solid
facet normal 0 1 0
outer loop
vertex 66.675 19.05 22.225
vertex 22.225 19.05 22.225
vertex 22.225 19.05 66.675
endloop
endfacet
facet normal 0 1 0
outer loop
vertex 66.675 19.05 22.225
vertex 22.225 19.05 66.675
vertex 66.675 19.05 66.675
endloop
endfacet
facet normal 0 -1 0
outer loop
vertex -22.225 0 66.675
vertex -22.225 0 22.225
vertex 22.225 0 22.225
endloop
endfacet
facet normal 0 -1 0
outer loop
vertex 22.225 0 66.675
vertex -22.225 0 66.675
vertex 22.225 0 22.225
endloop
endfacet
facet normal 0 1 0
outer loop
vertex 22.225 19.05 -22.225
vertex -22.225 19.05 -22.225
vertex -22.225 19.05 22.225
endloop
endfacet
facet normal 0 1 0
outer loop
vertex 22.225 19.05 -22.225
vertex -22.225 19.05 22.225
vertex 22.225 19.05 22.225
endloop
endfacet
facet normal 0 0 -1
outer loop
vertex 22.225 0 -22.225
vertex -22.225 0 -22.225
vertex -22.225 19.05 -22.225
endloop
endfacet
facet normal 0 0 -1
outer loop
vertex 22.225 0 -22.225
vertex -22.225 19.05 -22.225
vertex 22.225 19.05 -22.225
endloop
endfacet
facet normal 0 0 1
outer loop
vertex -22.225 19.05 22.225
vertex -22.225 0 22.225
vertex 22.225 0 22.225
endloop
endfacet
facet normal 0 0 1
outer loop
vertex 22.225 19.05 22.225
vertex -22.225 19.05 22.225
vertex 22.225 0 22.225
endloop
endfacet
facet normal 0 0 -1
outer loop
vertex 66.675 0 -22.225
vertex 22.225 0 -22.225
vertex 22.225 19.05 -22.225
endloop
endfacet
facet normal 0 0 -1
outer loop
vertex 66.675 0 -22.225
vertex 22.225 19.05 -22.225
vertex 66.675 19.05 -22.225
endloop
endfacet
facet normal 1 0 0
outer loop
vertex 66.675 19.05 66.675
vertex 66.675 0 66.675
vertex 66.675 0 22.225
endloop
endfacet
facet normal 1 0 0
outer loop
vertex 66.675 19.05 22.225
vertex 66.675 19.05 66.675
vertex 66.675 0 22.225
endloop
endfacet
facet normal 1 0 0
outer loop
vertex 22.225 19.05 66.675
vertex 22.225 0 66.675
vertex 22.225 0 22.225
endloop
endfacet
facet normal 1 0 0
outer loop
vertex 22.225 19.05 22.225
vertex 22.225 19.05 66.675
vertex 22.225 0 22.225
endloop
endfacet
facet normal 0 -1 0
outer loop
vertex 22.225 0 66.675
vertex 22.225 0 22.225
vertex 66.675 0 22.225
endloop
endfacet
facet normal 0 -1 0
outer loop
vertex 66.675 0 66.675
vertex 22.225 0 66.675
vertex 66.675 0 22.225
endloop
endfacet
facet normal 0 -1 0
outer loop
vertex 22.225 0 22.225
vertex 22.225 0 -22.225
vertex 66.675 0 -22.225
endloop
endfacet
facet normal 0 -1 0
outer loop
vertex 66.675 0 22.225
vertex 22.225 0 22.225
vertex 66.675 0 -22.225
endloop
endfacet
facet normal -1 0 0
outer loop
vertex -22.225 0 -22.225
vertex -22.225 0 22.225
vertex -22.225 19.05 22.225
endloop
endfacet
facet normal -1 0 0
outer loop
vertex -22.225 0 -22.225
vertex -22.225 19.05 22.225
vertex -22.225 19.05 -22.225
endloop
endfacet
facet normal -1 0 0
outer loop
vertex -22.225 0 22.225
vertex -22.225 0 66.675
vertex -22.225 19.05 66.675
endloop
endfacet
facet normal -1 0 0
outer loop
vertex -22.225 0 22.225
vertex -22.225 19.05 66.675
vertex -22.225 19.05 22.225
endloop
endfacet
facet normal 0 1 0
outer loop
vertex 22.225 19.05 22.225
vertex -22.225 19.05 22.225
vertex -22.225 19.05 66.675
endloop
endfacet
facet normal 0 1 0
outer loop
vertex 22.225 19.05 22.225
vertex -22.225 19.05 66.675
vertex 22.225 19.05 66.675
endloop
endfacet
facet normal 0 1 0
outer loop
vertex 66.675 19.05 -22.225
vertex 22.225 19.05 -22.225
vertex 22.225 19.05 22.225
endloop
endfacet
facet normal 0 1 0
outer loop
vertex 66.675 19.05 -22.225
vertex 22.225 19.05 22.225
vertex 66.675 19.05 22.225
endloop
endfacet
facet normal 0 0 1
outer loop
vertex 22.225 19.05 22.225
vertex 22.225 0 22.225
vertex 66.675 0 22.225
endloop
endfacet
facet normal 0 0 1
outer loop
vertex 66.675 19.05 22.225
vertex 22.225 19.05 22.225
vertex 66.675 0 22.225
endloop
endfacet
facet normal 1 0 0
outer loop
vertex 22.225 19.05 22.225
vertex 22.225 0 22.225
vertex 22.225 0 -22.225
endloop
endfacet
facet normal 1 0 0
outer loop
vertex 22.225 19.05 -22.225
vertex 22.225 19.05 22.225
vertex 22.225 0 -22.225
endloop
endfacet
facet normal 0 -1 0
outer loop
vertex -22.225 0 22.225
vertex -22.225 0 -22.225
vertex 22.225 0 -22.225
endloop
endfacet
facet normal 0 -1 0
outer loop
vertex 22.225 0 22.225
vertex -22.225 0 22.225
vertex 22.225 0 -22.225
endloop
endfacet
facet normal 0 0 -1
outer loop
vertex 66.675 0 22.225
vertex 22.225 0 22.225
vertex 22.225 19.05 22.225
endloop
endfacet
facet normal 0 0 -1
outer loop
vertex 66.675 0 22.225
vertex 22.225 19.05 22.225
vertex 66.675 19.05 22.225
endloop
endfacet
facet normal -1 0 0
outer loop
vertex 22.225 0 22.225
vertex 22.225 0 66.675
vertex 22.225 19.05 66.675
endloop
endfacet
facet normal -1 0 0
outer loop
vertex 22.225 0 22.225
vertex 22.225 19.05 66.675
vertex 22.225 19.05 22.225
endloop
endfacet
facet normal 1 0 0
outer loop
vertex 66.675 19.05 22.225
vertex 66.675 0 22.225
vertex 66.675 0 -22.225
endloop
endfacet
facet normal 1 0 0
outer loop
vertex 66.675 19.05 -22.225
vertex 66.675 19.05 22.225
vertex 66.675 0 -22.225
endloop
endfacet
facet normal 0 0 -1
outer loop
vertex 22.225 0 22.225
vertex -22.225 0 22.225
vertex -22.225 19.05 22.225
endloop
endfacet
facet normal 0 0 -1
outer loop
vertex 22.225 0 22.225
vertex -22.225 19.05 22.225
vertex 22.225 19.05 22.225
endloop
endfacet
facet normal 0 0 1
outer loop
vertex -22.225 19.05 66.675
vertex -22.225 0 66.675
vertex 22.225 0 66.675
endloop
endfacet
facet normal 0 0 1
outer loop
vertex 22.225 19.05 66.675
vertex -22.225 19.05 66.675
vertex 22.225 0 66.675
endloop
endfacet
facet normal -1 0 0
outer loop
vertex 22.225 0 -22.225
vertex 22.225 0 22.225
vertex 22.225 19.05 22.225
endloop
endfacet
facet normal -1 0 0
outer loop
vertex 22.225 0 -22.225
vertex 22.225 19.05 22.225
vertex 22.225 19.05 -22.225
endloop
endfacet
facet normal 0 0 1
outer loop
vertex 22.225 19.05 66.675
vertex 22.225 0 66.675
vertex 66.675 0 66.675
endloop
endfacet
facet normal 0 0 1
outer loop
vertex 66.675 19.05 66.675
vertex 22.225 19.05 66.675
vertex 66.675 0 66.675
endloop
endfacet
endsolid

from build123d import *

# Parameters (mm, degrees)
SKETCH1_W           = 44.45
SKETCH1_H           = 44.45
BOSS_EXTRUDE1_DEPTH = 19.05
SKETCH3_W           = 44.45
SKETCH3_H           = 44.45
BOSS_EXTRUDE2_DEPTH = 19.05
SKETCH4_W           = 44.45
SKETCH4_H           = 44.45
BOSS_EXTRUDE3_DEPTH = 19.05
SKETCH5_W           = 44.45
SKETCH5_H           = 44.45
BOSS_EXTRUDE4_DEPTH = 19.05


with BuildPart() as part:
    # Sketch1 → Boss-Extrude1 (new body)
    with BuildSketch(Plane(origin=(0, 0, 0), x_dir=(1, 0, 0), z_dir=(0, 1, 0))):
        Rectangle(SKETCH1_W, SKETCH1_H)
    extrude(amount=BOSS_EXTRUDE1_DEPTH)


with BuildPart() as body_2:
    # Sketch3 → Boss-Extrude2 (new body)
    with BuildSketch(Plane(origin=(0, 0, 0), x_dir=(1, 0, 0), z_dir=(0, 1, 0))):
        with Locations((44.45, 0)):
            Rectangle(SKETCH3_W, SKETCH3_H)
    extrude(amount=BOSS_EXTRUDE2_DEPTH)


with BuildPart() as body_3:
    # Sketch4 → Boss-Extrude3 (new body)
    with BuildSketch(Plane(origin=(0, 0, 0), x_dir=(1, 0, 0), z_dir=(0, 1, 0))):
        with Locations((0, -44.45)):
            Rectangle(SKETCH4_W, SKETCH4_H)
    extrude(amount=BOSS_EXTRUDE3_DEPTH)


with BuildPart() as body_4:
    # Sketch5 → Boss-Extrude4 (new body)
    with BuildSketch(Plane(origin=(0, 0, 0), x_dir=(1, 0, 0), z_dir=(0, 1, 0))):
        with Locations((44.45, -44.45)):
            Rectangle(SKETCH5_W, SKETCH5_H)
    extrude(amount=BOSS_EXTRUDE4_DEPTH)


solid = Compound([part.part, body_2.part, body_3.part, body_4.part])
